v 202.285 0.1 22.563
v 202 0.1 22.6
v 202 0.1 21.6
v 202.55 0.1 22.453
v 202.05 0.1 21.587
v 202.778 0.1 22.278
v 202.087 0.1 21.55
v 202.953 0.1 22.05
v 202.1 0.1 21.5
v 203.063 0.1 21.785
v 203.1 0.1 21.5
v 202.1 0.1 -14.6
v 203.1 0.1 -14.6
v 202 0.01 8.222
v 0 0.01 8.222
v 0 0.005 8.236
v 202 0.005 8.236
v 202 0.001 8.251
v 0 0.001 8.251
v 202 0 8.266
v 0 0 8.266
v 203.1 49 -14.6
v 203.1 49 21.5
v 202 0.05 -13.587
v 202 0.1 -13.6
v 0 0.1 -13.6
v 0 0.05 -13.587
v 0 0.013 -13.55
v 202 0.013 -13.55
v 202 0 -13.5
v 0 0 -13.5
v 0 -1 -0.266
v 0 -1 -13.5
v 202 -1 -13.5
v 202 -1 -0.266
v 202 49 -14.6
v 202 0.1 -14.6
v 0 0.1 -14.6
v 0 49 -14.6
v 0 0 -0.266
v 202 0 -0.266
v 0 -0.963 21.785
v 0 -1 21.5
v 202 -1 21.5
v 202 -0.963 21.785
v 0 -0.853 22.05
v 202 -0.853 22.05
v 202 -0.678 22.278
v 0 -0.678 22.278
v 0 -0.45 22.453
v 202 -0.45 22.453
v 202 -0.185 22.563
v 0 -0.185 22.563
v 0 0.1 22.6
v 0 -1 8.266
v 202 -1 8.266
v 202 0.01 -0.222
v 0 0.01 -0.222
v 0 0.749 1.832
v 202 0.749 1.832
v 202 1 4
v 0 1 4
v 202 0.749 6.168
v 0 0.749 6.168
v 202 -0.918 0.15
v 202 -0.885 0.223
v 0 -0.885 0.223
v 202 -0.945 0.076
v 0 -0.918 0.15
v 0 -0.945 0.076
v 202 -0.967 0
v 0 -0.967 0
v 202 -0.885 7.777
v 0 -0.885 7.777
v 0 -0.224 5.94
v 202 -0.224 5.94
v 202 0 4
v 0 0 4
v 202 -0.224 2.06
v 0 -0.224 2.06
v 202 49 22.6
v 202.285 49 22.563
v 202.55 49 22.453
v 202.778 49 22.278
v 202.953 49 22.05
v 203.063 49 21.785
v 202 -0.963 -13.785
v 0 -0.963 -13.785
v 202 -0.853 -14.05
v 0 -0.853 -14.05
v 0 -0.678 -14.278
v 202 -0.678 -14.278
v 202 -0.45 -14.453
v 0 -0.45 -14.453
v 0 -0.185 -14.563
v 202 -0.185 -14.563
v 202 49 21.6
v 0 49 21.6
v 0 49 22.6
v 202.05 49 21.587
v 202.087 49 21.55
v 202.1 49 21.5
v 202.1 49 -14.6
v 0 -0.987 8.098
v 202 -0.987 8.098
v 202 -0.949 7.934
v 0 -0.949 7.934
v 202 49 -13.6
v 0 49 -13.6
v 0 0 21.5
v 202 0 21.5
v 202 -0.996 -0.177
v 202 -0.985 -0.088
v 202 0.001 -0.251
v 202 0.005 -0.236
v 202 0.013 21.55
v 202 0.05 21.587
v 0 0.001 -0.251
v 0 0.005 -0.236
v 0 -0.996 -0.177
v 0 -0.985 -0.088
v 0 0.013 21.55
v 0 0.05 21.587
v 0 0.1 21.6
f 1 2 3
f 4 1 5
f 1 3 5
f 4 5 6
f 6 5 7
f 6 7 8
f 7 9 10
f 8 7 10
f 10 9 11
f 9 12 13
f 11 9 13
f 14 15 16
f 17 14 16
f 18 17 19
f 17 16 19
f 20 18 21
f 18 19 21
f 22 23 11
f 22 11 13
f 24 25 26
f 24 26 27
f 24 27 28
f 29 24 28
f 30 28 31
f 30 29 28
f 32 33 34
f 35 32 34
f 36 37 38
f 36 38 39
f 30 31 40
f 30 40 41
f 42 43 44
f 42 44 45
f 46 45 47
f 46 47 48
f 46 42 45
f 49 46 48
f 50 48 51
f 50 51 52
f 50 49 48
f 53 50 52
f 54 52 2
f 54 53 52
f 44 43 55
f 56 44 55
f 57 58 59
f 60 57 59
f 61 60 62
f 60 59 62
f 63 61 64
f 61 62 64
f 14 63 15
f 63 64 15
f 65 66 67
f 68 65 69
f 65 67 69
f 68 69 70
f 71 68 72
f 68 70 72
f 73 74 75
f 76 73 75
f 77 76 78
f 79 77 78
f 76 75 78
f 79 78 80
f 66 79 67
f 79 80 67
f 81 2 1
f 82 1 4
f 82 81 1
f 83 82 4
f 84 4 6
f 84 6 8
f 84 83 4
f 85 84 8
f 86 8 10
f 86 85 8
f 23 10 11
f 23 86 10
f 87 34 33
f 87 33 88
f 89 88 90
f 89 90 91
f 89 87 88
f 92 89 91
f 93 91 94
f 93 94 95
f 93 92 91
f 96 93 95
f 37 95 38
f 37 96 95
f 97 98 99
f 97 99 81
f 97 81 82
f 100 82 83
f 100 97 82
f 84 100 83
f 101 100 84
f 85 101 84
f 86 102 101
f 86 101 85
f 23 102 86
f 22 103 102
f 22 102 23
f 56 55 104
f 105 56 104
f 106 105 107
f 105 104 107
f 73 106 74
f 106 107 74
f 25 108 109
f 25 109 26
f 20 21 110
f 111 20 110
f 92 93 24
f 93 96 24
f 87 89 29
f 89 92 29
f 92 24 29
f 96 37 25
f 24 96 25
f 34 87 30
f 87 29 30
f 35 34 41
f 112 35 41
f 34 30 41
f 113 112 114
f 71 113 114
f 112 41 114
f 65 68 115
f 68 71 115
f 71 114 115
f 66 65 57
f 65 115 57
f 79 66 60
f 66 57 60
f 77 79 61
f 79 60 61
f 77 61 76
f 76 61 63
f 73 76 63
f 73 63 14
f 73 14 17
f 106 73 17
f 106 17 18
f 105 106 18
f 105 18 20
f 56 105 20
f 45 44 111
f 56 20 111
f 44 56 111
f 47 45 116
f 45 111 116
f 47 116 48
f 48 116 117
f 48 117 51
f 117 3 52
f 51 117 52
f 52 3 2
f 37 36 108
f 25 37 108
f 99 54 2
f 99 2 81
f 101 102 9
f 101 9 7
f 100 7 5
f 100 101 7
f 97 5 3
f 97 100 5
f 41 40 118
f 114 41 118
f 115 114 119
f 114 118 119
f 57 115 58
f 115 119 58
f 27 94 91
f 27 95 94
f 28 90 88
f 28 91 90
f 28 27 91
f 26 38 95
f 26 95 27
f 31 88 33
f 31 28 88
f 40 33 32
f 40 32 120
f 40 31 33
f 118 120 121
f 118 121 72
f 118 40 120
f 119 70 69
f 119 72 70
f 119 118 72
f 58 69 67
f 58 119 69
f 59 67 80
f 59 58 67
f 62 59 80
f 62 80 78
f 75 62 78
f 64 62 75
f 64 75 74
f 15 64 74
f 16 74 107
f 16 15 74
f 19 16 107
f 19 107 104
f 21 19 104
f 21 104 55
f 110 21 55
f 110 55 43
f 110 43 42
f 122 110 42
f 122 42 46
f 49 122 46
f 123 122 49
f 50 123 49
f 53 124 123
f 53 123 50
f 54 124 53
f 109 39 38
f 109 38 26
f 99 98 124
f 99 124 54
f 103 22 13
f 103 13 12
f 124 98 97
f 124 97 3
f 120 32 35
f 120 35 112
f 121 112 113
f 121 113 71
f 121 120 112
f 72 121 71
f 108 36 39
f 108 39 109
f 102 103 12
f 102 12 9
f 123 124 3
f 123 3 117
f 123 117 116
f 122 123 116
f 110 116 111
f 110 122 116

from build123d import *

# Parameters (mm, degrees)
SKETCH2_W             = 202
SKETCH2_H             = 13.5
BASE_FLANGE1_DEPTH    = 1
EDGE_FLANGE1_DEPTH    = 202
SWEPT_FLANGE2_DEPTH   = 202
SWEPT_FLANGE2_2_DEPTH = 202
EDGE_FLANGE2_DEPTH    = 202
EDGE_FLANGE3_DEPTH    = 48.9


# Read off the part's stored shape, not the designer's step: Swept Flange2
# Sheet-metal steps are written as plain solids
with BuildPart() as part:
    # Sketch2 → Base-Flange1 (new body)
    with BuildSketch(Plane(origin=(0, 0, 0), x_dir=(1, 0, 0), z_dir=(0, 1, 0))):
        with Locations((101, 6.75)):
            Rectangle(SKETCH2_W, SKETCH2_H)
    extrude(amount=-BASE_FLANGE1_DEPTH)

    # Edge-Flange1 section (across the edge) → Edge-Flange1 (add)
    with BuildSketch(Plane(origin=(202, 0, -13.6), x_dir=(0, 0, 1), z_dir=(-1, 0, 0))):
        with BuildLine():
            Line((-1, 0.1), (-1, 49))
            Line((-1, 49), (0, 49))
            Line((0, 49), (0, 0.1))
            ThreePointArc((0, 0.1), (0.029289322, 0.029289322), (0.1, 0))
            Line((0.1, 0), (0.1, -1))
            ThreePointArc((0.1, -1), (-0.677817459, -0.677817459), (-1, 0.1))
        make_face()
    extrude(amount=EDGE_FLANGE1_DEPTH)

    # Swept Flange2 outline → Swept Flange2 (cut)
    with BuildSketch(Plane.YZ):
        with BuildLine():
            ThreePointArc((-1, -0.266145802), (-0.991798775, -0.132073302), (-0.967317391, 0))
            Line((-0.967317391, 0), (-1, 0))
            Line((-1, 0), (-1, -0.266145802))
        make_face()
    extrude(amount=SWEPT_FLANGE2_DEPTH, mode=Mode.SUBTRACT)

    # Swept Flange2 2 outline → Swept Flange2 2 (add)
    with BuildSketch(Plane.YZ):
        with BuildLine():
            Line((0, 21.5), (-1, 21.5))
            Line((-1, 21.5), (-1, 8.266145802))
            ThreePointArc((-1, 8.266145802), (-0.970971133, 8.015106296), (-0.885416667, 7.777316595))
            ThreePointArc((-0.885416667, 7.777316595), (0, 4), (-0.885416667, 0.222683405))
            ThreePointArc((-0.885416667, 0.222683405), (-0.932388615, 0.113556382), (-0.967317391, 0))
            Line((-0.967317391, 0), (0, 0))
            Line((0, 0), (0, -0.266145802))
            ThreePointArc((0, -0.266145802), (0.002638988, -0.243324029), (0.010416667, -0.221706783))
            ThreePointArc((0.010416667, -0.221706783), (1, 4), (0.010416667, 8.221706783))
            ThreePointArc((0.010416667, 8.221706783), (0.002638988, 8.243324029), (0, 8.266145802))
            Line((0, 8.266145802), (0, 21.5))
        make_face()
    extrude(amount=SWEPT_FLANGE2_2_DEPTH)

    # Edge-Flange2 section (across the edge) → Edge-Flange2 (add)
    with BuildSketch(Plane(origin=(0, 0, 21.6), x_dir=(0, 0, -1), z_dir=(1, 0, 0))):
        with BuildLine():
            Line((-1, 0.1), (-1, 49))
            Line((-1, 49), (0, 49))
            Line((0, 49), (0, 0.1))
            ThreePointArc((0, 0.1), (0.029289322, 0.029289322), (0.1, 0))
            Line((0.1, 0), (0.1, -1))
            ThreePointArc((0.1, -1), (-0.677817459, -0.677817459), (-1, 0.1))
        make_face()
    extrude(amount=EDGE_FLANGE2_DEPTH)

    # Edge-Flange3 section (across the edge) → Edge-Flange3 (add)
    with BuildSketch(Plane(origin=(202.1, 49, 21.6), x_dir=(-1, 0, 0), z_dir=(0, -1, 0))):
        with BuildLine():
            Line((-1, 0.1), (-1, 36.2))
            Line((-1, 36.2), (0, 36.2))
            Line((0, 36.2), (0, 0.1))
            ThreePointArc((0, 0.1), (0.029289322, 0.029289322), (0.1, 0))
            Line((0.1, 0), (0.1, -1))
            ThreePointArc((0.1, -1), (-0.677817459, -0.677817459), (-1, 0.1))
        make_face()
    extrude(amount=EDGE_FLANGE3_DEPTH)


solid = part.part
